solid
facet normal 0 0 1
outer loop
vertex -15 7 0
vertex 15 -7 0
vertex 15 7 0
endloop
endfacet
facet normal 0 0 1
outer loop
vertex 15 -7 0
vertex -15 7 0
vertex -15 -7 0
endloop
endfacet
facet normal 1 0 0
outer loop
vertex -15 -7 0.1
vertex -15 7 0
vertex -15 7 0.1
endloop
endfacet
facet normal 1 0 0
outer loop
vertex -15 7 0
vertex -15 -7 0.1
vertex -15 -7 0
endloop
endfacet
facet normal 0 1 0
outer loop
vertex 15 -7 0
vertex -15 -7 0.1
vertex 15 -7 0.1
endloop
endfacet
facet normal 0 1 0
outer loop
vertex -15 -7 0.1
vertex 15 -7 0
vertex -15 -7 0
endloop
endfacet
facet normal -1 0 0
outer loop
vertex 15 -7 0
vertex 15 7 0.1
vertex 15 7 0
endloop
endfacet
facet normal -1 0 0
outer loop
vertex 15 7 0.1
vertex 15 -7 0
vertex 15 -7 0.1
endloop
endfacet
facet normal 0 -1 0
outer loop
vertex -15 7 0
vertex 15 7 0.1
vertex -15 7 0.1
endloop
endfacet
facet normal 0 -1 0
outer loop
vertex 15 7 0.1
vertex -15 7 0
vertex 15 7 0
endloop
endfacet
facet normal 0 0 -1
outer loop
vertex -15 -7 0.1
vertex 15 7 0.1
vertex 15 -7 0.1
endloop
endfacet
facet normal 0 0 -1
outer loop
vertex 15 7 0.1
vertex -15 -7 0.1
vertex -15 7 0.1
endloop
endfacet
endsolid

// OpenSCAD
use <../lib.scad>
use <4613906b.scad>
use <87079.scad>
$fa=1; $fs=0.2;
function ldraw_lib__87079dq1(realsolid=false) = [
// 0 Tile  2 x  4 with Hieroglyphs (Eye on Top) Sticker
// 0 Name: 87079dq1.dat
// 0 Author: Christian Neumann [Wesley]
// 0 !LDRAW_ORG Shortcut UPDATE 2016-01
// 0 !LICENSE Licensed under CC BY 2.0 and CC BY 4.0 : see CAreadme.txt
// 
// 0 BFC CERTIFY CCW
  [0,"BFC","CERTIFY"],
  [0,"BFC","CCW"],
// 
// 0 !KEYWORDS Pharaoh's Quest, Set 7326
// 
// 0 !CMDLINE -c19
// 
// 0 !HISTORY 2016-12-31 [PTadmin] Official Update 2016-01
// 
// 
// 1 16 0 0 0 1 0 0 0 1 0 0 0 1 87079.dat
  [1,16,0,0,0,1,0,0,0,1,0,0,0,1, ldraw_lib__87079(realsolid)],
// 1 16 0 0 0 0 0 -1 0 1 0 1 0 0 4613906b.dat
  [1,16,0,0,0,0,0,-1,0,1,0,1,0,0, ldraw_lib__4613906b(realsolid)],
];
module ldraw_lib__87079dq1(step=0, col=false, unit=2/5, alt=false, line=0.2, solid=!$preview)
    makepoly(ldraw_lib__87079dq1(solid), step=step, col=col, unit=unit, alt=alt, line=line, solid=solid);
ldraw_lib__87079dq1(line=0.2);
